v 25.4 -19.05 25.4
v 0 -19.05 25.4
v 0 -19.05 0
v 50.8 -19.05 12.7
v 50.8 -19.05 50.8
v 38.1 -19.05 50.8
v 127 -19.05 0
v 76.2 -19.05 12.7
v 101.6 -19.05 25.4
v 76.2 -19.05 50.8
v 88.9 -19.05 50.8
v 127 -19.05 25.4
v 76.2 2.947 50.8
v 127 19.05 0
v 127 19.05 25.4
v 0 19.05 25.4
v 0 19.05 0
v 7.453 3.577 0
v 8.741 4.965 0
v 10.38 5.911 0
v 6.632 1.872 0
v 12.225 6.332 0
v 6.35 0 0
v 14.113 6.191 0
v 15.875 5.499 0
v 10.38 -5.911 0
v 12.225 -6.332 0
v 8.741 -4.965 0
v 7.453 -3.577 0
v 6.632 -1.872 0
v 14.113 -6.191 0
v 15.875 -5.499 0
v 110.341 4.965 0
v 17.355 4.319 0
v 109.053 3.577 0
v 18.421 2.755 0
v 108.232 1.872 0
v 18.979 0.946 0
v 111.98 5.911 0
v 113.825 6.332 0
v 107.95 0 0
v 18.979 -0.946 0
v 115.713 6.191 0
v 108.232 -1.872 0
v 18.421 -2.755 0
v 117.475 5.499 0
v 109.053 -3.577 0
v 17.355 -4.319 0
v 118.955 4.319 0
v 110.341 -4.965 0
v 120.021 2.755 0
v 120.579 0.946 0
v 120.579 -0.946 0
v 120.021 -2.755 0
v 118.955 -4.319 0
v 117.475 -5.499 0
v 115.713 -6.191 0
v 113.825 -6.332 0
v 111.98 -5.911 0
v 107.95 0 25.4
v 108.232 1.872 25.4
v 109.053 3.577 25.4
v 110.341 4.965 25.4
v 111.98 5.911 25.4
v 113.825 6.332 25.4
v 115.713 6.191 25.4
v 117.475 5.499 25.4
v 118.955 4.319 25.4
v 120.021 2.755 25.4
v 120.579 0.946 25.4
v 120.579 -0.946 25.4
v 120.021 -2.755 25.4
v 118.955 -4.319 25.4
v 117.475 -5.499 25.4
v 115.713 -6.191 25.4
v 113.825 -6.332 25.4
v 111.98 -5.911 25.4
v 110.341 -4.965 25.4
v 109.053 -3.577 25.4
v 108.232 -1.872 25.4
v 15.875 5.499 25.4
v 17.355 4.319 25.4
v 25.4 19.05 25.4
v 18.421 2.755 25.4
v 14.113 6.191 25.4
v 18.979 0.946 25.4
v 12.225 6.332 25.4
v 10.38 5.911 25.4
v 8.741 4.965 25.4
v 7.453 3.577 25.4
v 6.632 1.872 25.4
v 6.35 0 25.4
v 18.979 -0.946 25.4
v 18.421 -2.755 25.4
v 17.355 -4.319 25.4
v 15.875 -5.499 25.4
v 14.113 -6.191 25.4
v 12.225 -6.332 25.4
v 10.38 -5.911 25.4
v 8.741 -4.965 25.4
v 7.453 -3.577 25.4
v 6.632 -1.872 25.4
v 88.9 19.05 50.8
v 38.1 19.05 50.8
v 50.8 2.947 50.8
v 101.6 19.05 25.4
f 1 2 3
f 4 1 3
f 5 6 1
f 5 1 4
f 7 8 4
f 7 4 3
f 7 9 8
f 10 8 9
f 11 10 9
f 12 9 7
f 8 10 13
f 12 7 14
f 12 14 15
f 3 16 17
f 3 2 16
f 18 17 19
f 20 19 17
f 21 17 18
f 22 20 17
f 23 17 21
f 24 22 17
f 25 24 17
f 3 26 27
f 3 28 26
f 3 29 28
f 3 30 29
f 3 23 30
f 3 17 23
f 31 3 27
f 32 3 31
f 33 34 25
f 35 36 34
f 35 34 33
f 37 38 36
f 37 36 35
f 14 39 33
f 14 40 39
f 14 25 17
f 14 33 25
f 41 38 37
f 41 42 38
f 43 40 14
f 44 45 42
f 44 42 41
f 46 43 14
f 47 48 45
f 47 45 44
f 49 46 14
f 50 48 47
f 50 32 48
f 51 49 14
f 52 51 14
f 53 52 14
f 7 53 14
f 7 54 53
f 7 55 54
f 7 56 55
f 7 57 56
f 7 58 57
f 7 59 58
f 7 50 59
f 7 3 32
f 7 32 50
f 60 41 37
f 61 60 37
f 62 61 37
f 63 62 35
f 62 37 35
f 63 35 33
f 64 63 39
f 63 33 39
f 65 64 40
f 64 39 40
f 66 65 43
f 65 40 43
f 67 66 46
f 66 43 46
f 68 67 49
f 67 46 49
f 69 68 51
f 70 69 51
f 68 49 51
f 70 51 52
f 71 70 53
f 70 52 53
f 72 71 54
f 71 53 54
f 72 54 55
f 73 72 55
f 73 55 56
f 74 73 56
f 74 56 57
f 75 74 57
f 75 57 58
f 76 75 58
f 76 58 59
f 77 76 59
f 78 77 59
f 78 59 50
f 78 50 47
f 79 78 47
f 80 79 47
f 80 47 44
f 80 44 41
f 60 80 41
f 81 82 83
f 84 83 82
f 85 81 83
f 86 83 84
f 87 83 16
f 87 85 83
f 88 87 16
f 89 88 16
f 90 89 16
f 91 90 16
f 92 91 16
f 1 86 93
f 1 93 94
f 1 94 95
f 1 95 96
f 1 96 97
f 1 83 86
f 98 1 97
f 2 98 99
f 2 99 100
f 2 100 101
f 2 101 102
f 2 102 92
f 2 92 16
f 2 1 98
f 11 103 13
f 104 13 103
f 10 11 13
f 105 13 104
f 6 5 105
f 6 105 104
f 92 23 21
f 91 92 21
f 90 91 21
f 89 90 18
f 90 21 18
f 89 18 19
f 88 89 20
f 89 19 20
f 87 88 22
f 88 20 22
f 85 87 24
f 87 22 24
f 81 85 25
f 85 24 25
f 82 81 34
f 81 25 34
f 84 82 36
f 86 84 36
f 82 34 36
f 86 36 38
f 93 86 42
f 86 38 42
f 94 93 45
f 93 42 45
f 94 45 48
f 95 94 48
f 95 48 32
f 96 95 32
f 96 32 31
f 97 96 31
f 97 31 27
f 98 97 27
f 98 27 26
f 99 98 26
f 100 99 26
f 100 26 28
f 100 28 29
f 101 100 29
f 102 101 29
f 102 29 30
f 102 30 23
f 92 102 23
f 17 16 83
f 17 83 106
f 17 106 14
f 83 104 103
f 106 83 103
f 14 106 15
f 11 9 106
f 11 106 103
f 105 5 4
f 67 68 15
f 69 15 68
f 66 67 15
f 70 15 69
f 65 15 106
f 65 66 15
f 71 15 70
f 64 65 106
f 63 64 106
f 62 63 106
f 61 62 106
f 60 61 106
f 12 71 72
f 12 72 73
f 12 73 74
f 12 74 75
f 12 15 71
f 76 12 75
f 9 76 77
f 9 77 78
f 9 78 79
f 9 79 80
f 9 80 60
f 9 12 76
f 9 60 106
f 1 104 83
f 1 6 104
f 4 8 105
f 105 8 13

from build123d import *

# Parameters (mm, degrees)
F1_DEPTH = 19.05
F3_D     = 12.7
F3_DEPTH = 31.75
F6_DEPTH = 12.7


with BuildPart() as f1:
    # F0 (on Front) → F1 (new body, symmetric)
    with BuildSketch(Plane.XZ):
        Polygon((0, 25.4), (0, 0), (127, 0), (127, 25.4), (101.6, 25.4), (88.9, 50.8), (38.1, 50.8), (25.4, 25.4), align=None)
    extrude(amount=F1_DEPTH, both=True)

    # F3
    with Locations(Plane.XY.offset(25.4)):
        with Locations((12.7, 0), (114.3, 0)):
            Hole(F3_D / 2, depth=F3_DEPTH)

    # F5 (on offset) → F6 (cut, symmetric)
    with BuildSketch(Plane.YZ.offset(63.5)):
        Polygon((-19.05, 12.7), (2.947045, 50.8), (-19.05, 50.8), align=None)
    extrude(amount=F6_DEPTH, both=True, mode=Mode.SUBTRACT)


solid = f1.part
